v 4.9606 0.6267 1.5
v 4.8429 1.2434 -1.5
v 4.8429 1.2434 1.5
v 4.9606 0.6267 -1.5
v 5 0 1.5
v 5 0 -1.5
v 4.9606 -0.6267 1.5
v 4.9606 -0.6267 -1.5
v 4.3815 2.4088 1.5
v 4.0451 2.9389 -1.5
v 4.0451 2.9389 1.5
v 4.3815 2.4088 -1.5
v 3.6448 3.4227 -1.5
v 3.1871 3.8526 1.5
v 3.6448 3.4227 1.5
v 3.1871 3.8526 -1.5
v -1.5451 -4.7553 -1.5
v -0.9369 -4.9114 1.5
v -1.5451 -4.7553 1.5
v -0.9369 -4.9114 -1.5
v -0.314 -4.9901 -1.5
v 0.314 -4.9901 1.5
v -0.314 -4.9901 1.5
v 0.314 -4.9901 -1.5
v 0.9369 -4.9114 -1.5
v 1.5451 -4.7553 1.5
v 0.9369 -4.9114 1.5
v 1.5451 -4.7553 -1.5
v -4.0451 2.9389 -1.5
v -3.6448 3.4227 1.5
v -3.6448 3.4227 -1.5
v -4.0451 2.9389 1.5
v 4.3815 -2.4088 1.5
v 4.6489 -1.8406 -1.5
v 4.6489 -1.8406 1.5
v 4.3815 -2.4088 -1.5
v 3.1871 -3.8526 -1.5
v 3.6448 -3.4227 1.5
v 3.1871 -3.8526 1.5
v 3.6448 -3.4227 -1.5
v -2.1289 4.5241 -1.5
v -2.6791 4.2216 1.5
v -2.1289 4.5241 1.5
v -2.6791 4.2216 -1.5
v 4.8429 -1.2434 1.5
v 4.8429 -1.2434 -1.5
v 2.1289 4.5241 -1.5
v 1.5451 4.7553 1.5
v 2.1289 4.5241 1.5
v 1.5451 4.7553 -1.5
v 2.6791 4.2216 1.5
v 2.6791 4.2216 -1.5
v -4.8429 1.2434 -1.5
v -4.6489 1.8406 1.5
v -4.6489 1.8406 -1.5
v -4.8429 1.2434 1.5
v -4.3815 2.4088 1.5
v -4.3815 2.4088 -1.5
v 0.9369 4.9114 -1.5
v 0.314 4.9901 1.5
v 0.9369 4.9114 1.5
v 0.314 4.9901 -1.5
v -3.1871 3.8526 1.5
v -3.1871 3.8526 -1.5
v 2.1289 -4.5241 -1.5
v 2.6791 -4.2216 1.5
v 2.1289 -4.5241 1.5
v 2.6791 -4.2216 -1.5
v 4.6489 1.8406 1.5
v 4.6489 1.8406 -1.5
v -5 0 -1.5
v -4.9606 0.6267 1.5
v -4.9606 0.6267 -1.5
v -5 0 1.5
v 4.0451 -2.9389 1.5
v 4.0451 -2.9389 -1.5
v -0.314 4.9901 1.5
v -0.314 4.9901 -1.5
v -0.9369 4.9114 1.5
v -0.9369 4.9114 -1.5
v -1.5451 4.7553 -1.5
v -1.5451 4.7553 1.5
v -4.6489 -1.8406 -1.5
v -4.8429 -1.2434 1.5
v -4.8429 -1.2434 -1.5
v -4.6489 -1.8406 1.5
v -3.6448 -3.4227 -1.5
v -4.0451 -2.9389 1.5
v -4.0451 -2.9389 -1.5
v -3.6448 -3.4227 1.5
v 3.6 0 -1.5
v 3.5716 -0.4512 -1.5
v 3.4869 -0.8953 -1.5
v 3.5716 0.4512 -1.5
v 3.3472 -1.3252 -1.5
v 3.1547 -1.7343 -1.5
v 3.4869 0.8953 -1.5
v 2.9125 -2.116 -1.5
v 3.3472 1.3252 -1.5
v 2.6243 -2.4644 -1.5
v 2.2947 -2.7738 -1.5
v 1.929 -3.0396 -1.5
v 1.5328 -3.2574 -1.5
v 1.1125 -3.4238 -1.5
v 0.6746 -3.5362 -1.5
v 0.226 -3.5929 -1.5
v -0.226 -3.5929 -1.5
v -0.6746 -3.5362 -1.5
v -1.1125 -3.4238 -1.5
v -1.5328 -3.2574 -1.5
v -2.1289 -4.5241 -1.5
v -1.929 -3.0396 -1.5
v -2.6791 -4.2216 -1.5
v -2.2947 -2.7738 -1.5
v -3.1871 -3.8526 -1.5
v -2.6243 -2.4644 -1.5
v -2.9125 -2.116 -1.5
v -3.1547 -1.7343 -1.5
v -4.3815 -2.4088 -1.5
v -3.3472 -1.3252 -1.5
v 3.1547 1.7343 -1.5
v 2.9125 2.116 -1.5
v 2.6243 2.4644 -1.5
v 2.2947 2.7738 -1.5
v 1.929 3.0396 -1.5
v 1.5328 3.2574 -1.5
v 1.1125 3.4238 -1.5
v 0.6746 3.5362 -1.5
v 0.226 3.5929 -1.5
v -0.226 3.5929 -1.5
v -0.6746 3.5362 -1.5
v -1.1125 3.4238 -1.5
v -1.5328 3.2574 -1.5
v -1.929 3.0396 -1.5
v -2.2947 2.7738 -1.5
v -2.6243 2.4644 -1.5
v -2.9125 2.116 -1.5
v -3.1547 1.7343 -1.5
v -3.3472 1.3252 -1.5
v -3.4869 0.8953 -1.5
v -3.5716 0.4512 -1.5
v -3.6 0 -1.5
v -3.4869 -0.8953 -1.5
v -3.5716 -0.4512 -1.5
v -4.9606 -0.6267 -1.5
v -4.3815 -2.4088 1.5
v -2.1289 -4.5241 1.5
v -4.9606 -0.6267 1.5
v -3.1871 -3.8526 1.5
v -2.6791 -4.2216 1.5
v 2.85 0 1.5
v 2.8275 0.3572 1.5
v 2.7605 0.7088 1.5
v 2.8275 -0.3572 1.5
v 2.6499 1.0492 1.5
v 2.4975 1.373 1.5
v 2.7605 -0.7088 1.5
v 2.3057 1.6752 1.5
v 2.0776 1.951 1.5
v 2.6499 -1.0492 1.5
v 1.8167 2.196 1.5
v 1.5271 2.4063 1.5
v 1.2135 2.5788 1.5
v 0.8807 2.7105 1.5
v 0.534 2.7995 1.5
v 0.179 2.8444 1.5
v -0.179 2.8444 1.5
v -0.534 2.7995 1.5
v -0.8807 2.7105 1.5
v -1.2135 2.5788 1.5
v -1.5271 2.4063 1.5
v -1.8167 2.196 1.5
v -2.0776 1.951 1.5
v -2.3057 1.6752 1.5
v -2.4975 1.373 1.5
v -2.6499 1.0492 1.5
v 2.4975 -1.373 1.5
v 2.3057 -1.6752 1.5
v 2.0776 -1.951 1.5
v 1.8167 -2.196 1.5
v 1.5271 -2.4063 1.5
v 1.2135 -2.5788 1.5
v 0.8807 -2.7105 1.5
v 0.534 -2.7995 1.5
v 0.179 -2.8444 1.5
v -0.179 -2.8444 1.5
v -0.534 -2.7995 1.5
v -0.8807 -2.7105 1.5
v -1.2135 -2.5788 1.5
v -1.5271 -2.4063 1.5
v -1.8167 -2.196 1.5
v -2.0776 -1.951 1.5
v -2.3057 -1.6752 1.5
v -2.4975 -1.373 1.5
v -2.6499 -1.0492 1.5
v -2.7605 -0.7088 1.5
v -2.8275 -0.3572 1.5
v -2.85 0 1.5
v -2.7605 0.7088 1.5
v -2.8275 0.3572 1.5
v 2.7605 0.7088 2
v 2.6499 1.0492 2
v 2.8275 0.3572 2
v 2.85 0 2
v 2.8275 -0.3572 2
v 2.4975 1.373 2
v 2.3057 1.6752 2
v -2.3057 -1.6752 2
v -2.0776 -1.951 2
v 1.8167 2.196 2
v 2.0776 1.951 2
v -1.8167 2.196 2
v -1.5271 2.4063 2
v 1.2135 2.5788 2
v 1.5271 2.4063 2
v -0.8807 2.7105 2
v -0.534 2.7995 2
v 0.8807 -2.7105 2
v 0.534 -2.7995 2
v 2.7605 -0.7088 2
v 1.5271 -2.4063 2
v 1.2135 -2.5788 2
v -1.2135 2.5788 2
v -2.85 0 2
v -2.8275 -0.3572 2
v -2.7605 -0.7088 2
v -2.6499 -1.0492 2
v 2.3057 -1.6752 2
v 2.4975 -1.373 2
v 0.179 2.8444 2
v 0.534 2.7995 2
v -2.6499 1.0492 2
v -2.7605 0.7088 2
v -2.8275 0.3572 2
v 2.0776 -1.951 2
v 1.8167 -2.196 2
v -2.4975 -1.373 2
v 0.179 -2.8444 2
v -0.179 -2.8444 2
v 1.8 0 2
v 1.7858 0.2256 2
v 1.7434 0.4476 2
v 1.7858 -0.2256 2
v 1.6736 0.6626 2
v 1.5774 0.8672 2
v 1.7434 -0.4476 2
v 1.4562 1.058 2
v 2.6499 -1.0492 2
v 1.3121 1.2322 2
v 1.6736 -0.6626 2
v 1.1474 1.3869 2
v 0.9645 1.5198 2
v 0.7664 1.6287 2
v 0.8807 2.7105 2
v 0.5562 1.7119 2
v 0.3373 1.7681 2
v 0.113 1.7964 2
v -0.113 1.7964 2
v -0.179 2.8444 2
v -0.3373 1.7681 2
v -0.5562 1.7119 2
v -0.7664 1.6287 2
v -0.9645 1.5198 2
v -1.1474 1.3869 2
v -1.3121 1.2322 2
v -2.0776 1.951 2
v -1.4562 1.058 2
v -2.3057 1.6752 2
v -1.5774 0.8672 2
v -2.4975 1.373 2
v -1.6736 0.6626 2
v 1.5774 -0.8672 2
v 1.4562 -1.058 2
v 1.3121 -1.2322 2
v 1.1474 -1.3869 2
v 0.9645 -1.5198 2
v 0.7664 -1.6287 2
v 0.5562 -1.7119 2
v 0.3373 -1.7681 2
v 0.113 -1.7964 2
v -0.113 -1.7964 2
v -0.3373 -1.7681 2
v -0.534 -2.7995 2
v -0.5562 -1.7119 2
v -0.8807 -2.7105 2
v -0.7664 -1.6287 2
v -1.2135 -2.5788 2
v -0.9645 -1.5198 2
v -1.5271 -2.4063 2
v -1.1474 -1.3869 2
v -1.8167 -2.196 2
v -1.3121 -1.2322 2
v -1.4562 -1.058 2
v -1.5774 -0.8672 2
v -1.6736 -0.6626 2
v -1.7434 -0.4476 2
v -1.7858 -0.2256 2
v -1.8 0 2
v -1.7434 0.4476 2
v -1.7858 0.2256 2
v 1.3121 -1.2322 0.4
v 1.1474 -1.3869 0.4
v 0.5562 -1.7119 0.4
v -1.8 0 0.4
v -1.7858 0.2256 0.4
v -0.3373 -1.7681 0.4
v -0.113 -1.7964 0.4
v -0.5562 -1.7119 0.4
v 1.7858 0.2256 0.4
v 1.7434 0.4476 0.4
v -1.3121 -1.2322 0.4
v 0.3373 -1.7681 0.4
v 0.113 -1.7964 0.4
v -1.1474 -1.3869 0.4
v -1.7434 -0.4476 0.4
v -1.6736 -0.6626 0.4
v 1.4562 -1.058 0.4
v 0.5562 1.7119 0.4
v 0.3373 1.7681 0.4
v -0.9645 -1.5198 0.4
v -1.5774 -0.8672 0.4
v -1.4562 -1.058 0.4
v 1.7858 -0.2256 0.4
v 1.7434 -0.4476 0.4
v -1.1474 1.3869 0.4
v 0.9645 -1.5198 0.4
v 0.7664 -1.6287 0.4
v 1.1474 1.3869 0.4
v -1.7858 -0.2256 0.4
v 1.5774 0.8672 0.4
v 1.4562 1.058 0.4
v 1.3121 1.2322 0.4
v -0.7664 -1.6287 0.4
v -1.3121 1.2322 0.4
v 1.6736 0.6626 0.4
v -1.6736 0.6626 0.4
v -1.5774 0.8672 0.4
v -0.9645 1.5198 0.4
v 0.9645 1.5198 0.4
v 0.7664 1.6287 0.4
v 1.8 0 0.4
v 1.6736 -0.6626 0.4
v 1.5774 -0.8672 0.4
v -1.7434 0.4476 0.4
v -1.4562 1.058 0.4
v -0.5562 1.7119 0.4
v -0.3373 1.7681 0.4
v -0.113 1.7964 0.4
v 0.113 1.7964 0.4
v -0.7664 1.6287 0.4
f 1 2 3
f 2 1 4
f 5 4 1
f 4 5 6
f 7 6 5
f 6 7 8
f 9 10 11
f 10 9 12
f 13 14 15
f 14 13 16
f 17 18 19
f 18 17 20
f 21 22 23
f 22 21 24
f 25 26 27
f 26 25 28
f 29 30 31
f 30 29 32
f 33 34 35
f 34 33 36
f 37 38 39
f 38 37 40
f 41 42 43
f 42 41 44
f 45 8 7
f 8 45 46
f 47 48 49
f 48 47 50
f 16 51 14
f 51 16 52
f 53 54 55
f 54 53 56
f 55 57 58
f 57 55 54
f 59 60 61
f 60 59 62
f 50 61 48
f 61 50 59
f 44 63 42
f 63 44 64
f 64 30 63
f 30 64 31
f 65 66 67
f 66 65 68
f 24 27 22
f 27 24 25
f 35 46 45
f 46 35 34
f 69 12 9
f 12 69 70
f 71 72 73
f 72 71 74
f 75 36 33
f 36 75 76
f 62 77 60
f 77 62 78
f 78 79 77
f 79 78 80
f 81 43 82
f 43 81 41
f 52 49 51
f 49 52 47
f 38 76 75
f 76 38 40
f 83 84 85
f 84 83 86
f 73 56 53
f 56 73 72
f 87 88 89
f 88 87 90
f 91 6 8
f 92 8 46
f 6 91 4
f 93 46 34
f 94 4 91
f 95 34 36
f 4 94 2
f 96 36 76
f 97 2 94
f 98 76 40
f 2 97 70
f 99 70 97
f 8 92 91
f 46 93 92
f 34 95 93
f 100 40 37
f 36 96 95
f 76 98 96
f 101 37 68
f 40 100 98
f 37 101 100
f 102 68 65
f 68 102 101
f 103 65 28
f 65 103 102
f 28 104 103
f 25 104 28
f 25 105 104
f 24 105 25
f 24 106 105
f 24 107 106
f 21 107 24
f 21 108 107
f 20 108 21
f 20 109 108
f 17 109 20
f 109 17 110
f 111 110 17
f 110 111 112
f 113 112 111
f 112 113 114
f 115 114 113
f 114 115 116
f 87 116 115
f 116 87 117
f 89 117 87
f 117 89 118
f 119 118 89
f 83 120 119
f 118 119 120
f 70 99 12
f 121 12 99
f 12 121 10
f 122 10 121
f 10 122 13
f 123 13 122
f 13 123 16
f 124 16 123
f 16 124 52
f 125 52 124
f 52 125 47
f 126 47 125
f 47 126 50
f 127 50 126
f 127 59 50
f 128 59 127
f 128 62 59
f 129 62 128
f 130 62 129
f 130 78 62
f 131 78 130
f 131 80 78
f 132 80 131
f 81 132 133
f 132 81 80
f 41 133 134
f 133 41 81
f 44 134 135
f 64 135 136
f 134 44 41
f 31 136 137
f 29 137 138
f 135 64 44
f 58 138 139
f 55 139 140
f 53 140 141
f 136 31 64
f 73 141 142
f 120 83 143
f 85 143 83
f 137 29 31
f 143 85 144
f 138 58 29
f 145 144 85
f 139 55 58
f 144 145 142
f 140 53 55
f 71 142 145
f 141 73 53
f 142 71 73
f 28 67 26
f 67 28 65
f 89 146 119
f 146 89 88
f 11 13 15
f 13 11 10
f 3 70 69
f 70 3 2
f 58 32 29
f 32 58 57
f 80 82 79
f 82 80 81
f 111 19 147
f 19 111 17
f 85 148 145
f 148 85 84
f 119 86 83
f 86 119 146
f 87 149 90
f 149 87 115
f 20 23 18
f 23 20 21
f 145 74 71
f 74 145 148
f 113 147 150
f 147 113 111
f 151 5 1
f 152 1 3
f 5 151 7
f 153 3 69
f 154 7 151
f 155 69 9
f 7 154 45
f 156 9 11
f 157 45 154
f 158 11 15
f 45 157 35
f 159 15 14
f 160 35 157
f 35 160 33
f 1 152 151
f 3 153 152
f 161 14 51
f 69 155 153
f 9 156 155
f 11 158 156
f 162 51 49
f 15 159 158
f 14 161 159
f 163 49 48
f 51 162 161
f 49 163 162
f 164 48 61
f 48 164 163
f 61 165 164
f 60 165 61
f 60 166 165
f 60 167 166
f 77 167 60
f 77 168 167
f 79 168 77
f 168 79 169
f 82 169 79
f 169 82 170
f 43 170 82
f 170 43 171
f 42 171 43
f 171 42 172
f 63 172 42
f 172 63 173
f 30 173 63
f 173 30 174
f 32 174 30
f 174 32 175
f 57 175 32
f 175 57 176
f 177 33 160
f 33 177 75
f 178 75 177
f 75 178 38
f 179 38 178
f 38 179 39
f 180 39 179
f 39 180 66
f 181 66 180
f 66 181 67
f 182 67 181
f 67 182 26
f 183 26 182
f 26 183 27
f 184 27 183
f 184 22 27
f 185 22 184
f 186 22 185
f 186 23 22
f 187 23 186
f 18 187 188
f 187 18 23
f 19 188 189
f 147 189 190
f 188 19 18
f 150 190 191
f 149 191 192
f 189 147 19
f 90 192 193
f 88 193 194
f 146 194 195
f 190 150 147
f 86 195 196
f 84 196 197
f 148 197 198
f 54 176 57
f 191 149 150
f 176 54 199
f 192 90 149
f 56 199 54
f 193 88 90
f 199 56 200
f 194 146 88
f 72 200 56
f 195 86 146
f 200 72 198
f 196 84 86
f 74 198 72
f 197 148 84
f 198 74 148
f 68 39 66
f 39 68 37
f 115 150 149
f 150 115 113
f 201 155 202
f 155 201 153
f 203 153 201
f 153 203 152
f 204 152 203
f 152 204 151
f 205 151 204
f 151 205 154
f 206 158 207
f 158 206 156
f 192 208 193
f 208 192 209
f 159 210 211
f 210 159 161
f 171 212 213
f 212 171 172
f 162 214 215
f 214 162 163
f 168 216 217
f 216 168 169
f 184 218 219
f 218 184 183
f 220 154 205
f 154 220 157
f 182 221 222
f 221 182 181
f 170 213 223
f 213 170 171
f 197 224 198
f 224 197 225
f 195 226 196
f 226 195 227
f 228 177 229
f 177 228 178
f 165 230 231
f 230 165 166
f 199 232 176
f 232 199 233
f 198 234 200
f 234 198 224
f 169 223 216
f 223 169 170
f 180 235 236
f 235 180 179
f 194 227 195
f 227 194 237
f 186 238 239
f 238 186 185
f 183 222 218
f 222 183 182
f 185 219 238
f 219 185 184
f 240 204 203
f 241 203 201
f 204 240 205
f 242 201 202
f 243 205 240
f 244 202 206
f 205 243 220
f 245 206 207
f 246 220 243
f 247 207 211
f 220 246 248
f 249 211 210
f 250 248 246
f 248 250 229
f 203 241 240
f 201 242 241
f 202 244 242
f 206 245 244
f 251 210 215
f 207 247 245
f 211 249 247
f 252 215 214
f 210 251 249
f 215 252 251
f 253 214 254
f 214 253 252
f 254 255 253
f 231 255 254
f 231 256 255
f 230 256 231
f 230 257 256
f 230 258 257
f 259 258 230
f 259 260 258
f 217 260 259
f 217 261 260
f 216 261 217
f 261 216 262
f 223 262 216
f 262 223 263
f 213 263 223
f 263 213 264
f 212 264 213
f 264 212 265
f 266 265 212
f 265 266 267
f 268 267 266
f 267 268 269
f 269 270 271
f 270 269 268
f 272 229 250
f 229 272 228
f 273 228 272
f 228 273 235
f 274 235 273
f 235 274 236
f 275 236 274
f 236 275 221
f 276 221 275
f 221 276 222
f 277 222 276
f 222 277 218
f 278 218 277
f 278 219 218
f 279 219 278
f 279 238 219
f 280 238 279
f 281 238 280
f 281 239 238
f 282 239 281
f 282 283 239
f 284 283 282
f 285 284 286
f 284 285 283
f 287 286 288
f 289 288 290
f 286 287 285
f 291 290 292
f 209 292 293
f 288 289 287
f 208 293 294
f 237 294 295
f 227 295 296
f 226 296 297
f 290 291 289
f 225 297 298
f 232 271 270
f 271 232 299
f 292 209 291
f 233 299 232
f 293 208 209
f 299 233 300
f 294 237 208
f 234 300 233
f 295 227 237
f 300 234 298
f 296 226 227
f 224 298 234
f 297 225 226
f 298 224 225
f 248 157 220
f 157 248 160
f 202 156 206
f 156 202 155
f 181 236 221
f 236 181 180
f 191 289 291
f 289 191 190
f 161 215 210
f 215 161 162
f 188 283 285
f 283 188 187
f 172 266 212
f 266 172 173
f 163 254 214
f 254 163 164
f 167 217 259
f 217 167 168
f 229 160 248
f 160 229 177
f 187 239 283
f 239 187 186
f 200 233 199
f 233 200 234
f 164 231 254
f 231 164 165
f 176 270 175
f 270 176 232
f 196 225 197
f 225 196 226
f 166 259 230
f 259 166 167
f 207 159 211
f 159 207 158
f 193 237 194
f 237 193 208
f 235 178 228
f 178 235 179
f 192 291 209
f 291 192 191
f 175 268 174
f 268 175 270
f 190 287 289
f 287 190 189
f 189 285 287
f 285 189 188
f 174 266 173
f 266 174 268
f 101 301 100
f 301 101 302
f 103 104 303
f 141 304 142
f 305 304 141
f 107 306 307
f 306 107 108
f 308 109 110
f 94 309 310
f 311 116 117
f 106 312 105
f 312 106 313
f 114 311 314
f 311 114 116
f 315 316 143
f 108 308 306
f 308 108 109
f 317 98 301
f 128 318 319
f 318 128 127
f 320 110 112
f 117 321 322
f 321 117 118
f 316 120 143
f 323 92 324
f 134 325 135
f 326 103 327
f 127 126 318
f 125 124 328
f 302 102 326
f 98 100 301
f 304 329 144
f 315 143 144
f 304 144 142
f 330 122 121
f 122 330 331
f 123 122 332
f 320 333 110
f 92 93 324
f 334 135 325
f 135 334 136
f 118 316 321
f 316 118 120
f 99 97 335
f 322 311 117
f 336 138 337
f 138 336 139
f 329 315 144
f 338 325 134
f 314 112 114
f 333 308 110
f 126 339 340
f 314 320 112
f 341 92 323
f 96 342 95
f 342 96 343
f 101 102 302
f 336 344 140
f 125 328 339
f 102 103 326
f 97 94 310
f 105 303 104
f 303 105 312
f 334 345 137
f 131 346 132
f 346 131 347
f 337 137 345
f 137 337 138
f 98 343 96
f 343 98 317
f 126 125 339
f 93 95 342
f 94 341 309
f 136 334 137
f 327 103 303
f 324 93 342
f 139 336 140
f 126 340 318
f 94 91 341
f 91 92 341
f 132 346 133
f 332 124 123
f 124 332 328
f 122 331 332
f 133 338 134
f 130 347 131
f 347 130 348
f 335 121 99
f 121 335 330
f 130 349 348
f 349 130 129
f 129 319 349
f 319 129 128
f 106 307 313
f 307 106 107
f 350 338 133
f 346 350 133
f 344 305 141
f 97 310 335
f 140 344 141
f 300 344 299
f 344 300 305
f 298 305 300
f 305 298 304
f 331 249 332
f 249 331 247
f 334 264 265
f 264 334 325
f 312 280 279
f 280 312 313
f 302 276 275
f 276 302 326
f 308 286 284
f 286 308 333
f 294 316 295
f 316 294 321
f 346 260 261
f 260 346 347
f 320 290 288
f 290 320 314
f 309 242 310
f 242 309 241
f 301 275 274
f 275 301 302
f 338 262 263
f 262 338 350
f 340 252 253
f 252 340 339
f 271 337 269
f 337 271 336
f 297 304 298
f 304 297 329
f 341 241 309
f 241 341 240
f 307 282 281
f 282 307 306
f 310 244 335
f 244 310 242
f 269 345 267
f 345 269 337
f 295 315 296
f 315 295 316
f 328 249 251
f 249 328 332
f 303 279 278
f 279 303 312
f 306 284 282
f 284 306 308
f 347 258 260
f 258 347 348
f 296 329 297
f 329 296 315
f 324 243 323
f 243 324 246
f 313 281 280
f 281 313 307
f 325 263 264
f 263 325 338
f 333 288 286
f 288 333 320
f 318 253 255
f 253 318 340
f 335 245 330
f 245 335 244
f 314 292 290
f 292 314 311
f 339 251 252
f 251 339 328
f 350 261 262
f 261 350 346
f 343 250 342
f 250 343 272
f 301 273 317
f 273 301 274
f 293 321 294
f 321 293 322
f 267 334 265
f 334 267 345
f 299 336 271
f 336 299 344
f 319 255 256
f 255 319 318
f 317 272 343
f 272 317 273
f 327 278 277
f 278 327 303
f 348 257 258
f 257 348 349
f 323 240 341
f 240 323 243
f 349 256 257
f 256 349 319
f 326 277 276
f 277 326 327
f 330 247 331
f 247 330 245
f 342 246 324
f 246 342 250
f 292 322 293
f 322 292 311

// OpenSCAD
$fn = 50;


difference() {
	union() {
		translate(v = [0, 0, -1.5000000000]) {
			cylinder(h = 3, r = 5.0000000000);
		}
		translate(v = [0, 0, -1.5000000000]) {
			cylinder(h = 3.5000000000, r = 2.8500000000);
		}
	}
	union() {
		translate(v = [0, 0, -1.5000000000]) {
			rotate(a = [0, 180, 0]) {
				difference() {
					union() {
						translate(v = [0, 0, -3.5000000000]) {
							cylinder(h = 3.5000000000, r = 1.5000000000);
						}
						translate(v = [0, 0, -1.9000000000]) {
							cylinder(h = 1.9000000000, r1 = 1.8000000000, r2 = 3.6000000000);
						}
						translate(v = [0, 0, -3.5000000000]) {
							cylinder(h = 3.5000000000, r = 1.8000000000);
						}
						translate(v = [0, 0, -3.5000000000]) {
							cylinder(h = 3.5000000000, r = 1.5000000000);
						}
					}
					union();
				}
			}
		}
		translate(v = [0, 0, -50.0000000000]) {
			cylinder(h = 100, r = 1.8000000000);
		}
	}
}
